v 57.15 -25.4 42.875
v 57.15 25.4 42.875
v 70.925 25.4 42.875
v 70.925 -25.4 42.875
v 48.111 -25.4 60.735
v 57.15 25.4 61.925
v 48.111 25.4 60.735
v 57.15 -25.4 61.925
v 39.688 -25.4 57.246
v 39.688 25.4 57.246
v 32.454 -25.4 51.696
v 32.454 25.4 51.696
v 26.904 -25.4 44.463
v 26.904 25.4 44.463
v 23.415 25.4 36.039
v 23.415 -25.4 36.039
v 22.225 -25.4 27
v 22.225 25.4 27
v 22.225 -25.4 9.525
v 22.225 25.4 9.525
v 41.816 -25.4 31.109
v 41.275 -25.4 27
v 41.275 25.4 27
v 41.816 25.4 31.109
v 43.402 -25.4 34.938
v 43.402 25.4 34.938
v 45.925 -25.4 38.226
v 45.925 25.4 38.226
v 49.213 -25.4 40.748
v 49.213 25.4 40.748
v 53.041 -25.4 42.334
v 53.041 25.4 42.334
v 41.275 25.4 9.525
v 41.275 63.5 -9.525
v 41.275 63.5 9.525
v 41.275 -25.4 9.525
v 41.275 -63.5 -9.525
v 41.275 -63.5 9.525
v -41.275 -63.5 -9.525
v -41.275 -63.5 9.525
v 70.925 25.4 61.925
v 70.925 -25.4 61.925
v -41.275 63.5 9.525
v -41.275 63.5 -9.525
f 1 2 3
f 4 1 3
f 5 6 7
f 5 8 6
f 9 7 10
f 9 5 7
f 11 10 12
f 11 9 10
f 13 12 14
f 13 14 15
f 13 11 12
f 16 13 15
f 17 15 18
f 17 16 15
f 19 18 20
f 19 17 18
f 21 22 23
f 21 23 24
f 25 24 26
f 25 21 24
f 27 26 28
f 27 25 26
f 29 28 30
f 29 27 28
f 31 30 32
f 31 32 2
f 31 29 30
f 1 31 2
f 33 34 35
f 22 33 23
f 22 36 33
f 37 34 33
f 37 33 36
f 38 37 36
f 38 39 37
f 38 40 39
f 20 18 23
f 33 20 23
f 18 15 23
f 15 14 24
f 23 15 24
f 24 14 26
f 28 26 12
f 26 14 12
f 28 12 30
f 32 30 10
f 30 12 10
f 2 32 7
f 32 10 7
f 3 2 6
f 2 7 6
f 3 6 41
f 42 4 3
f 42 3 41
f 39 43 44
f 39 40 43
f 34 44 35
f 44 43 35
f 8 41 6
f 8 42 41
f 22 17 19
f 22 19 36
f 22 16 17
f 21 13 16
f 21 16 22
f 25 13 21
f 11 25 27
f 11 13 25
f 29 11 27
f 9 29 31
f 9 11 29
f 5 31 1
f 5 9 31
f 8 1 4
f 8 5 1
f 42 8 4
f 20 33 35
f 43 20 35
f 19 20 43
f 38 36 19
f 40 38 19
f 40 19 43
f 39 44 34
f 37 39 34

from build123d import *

# Parameters (mm, degrees)
F2_DEPTH = 63.5
F3_DEPTH = 25.4


with BuildPart() as f2:
    # F0 (on Front) → F2 (new body, symmetric)
    with BuildSketch(Plane.XZ):
        Polygon((-41.275, -9.525), (41.275, -9.525), (41.275, 9.525), (22.225, 9.525), (-41.275, 9.525), align=None)
    extrude(amount=F2_DEPTH, both=True)

    # F1 (on face) → F3 (join, symmetric)
    with BuildSketch(Plane.XZ):
        with BuildLine():
            Line((22.225, 27.0002), (22.225, 9.525))
            Line((22.225, 9.525), (41.275, 9.525))
            Line((41.275, 9.525), (41.275, 27.0002))
            ThreePointArc((41.275, 27.0002), (45.92468, 38.22552), (57.15, 42.8752))
            Line((57.15, 42.8752), (70.925324, 42.8752))
            Line((70.925324, 42.8752), (70.925324, 61.9252))
            Line((70.925324, 61.9252), (57.15, 61.9252))
            ThreePointArc((57.15, 61.9252), (32.454296, 51.695904), (22.225, 27.0002))
        make_face()
    extrude(amount=F3_DEPTH, both=True)


solid = f2.part
